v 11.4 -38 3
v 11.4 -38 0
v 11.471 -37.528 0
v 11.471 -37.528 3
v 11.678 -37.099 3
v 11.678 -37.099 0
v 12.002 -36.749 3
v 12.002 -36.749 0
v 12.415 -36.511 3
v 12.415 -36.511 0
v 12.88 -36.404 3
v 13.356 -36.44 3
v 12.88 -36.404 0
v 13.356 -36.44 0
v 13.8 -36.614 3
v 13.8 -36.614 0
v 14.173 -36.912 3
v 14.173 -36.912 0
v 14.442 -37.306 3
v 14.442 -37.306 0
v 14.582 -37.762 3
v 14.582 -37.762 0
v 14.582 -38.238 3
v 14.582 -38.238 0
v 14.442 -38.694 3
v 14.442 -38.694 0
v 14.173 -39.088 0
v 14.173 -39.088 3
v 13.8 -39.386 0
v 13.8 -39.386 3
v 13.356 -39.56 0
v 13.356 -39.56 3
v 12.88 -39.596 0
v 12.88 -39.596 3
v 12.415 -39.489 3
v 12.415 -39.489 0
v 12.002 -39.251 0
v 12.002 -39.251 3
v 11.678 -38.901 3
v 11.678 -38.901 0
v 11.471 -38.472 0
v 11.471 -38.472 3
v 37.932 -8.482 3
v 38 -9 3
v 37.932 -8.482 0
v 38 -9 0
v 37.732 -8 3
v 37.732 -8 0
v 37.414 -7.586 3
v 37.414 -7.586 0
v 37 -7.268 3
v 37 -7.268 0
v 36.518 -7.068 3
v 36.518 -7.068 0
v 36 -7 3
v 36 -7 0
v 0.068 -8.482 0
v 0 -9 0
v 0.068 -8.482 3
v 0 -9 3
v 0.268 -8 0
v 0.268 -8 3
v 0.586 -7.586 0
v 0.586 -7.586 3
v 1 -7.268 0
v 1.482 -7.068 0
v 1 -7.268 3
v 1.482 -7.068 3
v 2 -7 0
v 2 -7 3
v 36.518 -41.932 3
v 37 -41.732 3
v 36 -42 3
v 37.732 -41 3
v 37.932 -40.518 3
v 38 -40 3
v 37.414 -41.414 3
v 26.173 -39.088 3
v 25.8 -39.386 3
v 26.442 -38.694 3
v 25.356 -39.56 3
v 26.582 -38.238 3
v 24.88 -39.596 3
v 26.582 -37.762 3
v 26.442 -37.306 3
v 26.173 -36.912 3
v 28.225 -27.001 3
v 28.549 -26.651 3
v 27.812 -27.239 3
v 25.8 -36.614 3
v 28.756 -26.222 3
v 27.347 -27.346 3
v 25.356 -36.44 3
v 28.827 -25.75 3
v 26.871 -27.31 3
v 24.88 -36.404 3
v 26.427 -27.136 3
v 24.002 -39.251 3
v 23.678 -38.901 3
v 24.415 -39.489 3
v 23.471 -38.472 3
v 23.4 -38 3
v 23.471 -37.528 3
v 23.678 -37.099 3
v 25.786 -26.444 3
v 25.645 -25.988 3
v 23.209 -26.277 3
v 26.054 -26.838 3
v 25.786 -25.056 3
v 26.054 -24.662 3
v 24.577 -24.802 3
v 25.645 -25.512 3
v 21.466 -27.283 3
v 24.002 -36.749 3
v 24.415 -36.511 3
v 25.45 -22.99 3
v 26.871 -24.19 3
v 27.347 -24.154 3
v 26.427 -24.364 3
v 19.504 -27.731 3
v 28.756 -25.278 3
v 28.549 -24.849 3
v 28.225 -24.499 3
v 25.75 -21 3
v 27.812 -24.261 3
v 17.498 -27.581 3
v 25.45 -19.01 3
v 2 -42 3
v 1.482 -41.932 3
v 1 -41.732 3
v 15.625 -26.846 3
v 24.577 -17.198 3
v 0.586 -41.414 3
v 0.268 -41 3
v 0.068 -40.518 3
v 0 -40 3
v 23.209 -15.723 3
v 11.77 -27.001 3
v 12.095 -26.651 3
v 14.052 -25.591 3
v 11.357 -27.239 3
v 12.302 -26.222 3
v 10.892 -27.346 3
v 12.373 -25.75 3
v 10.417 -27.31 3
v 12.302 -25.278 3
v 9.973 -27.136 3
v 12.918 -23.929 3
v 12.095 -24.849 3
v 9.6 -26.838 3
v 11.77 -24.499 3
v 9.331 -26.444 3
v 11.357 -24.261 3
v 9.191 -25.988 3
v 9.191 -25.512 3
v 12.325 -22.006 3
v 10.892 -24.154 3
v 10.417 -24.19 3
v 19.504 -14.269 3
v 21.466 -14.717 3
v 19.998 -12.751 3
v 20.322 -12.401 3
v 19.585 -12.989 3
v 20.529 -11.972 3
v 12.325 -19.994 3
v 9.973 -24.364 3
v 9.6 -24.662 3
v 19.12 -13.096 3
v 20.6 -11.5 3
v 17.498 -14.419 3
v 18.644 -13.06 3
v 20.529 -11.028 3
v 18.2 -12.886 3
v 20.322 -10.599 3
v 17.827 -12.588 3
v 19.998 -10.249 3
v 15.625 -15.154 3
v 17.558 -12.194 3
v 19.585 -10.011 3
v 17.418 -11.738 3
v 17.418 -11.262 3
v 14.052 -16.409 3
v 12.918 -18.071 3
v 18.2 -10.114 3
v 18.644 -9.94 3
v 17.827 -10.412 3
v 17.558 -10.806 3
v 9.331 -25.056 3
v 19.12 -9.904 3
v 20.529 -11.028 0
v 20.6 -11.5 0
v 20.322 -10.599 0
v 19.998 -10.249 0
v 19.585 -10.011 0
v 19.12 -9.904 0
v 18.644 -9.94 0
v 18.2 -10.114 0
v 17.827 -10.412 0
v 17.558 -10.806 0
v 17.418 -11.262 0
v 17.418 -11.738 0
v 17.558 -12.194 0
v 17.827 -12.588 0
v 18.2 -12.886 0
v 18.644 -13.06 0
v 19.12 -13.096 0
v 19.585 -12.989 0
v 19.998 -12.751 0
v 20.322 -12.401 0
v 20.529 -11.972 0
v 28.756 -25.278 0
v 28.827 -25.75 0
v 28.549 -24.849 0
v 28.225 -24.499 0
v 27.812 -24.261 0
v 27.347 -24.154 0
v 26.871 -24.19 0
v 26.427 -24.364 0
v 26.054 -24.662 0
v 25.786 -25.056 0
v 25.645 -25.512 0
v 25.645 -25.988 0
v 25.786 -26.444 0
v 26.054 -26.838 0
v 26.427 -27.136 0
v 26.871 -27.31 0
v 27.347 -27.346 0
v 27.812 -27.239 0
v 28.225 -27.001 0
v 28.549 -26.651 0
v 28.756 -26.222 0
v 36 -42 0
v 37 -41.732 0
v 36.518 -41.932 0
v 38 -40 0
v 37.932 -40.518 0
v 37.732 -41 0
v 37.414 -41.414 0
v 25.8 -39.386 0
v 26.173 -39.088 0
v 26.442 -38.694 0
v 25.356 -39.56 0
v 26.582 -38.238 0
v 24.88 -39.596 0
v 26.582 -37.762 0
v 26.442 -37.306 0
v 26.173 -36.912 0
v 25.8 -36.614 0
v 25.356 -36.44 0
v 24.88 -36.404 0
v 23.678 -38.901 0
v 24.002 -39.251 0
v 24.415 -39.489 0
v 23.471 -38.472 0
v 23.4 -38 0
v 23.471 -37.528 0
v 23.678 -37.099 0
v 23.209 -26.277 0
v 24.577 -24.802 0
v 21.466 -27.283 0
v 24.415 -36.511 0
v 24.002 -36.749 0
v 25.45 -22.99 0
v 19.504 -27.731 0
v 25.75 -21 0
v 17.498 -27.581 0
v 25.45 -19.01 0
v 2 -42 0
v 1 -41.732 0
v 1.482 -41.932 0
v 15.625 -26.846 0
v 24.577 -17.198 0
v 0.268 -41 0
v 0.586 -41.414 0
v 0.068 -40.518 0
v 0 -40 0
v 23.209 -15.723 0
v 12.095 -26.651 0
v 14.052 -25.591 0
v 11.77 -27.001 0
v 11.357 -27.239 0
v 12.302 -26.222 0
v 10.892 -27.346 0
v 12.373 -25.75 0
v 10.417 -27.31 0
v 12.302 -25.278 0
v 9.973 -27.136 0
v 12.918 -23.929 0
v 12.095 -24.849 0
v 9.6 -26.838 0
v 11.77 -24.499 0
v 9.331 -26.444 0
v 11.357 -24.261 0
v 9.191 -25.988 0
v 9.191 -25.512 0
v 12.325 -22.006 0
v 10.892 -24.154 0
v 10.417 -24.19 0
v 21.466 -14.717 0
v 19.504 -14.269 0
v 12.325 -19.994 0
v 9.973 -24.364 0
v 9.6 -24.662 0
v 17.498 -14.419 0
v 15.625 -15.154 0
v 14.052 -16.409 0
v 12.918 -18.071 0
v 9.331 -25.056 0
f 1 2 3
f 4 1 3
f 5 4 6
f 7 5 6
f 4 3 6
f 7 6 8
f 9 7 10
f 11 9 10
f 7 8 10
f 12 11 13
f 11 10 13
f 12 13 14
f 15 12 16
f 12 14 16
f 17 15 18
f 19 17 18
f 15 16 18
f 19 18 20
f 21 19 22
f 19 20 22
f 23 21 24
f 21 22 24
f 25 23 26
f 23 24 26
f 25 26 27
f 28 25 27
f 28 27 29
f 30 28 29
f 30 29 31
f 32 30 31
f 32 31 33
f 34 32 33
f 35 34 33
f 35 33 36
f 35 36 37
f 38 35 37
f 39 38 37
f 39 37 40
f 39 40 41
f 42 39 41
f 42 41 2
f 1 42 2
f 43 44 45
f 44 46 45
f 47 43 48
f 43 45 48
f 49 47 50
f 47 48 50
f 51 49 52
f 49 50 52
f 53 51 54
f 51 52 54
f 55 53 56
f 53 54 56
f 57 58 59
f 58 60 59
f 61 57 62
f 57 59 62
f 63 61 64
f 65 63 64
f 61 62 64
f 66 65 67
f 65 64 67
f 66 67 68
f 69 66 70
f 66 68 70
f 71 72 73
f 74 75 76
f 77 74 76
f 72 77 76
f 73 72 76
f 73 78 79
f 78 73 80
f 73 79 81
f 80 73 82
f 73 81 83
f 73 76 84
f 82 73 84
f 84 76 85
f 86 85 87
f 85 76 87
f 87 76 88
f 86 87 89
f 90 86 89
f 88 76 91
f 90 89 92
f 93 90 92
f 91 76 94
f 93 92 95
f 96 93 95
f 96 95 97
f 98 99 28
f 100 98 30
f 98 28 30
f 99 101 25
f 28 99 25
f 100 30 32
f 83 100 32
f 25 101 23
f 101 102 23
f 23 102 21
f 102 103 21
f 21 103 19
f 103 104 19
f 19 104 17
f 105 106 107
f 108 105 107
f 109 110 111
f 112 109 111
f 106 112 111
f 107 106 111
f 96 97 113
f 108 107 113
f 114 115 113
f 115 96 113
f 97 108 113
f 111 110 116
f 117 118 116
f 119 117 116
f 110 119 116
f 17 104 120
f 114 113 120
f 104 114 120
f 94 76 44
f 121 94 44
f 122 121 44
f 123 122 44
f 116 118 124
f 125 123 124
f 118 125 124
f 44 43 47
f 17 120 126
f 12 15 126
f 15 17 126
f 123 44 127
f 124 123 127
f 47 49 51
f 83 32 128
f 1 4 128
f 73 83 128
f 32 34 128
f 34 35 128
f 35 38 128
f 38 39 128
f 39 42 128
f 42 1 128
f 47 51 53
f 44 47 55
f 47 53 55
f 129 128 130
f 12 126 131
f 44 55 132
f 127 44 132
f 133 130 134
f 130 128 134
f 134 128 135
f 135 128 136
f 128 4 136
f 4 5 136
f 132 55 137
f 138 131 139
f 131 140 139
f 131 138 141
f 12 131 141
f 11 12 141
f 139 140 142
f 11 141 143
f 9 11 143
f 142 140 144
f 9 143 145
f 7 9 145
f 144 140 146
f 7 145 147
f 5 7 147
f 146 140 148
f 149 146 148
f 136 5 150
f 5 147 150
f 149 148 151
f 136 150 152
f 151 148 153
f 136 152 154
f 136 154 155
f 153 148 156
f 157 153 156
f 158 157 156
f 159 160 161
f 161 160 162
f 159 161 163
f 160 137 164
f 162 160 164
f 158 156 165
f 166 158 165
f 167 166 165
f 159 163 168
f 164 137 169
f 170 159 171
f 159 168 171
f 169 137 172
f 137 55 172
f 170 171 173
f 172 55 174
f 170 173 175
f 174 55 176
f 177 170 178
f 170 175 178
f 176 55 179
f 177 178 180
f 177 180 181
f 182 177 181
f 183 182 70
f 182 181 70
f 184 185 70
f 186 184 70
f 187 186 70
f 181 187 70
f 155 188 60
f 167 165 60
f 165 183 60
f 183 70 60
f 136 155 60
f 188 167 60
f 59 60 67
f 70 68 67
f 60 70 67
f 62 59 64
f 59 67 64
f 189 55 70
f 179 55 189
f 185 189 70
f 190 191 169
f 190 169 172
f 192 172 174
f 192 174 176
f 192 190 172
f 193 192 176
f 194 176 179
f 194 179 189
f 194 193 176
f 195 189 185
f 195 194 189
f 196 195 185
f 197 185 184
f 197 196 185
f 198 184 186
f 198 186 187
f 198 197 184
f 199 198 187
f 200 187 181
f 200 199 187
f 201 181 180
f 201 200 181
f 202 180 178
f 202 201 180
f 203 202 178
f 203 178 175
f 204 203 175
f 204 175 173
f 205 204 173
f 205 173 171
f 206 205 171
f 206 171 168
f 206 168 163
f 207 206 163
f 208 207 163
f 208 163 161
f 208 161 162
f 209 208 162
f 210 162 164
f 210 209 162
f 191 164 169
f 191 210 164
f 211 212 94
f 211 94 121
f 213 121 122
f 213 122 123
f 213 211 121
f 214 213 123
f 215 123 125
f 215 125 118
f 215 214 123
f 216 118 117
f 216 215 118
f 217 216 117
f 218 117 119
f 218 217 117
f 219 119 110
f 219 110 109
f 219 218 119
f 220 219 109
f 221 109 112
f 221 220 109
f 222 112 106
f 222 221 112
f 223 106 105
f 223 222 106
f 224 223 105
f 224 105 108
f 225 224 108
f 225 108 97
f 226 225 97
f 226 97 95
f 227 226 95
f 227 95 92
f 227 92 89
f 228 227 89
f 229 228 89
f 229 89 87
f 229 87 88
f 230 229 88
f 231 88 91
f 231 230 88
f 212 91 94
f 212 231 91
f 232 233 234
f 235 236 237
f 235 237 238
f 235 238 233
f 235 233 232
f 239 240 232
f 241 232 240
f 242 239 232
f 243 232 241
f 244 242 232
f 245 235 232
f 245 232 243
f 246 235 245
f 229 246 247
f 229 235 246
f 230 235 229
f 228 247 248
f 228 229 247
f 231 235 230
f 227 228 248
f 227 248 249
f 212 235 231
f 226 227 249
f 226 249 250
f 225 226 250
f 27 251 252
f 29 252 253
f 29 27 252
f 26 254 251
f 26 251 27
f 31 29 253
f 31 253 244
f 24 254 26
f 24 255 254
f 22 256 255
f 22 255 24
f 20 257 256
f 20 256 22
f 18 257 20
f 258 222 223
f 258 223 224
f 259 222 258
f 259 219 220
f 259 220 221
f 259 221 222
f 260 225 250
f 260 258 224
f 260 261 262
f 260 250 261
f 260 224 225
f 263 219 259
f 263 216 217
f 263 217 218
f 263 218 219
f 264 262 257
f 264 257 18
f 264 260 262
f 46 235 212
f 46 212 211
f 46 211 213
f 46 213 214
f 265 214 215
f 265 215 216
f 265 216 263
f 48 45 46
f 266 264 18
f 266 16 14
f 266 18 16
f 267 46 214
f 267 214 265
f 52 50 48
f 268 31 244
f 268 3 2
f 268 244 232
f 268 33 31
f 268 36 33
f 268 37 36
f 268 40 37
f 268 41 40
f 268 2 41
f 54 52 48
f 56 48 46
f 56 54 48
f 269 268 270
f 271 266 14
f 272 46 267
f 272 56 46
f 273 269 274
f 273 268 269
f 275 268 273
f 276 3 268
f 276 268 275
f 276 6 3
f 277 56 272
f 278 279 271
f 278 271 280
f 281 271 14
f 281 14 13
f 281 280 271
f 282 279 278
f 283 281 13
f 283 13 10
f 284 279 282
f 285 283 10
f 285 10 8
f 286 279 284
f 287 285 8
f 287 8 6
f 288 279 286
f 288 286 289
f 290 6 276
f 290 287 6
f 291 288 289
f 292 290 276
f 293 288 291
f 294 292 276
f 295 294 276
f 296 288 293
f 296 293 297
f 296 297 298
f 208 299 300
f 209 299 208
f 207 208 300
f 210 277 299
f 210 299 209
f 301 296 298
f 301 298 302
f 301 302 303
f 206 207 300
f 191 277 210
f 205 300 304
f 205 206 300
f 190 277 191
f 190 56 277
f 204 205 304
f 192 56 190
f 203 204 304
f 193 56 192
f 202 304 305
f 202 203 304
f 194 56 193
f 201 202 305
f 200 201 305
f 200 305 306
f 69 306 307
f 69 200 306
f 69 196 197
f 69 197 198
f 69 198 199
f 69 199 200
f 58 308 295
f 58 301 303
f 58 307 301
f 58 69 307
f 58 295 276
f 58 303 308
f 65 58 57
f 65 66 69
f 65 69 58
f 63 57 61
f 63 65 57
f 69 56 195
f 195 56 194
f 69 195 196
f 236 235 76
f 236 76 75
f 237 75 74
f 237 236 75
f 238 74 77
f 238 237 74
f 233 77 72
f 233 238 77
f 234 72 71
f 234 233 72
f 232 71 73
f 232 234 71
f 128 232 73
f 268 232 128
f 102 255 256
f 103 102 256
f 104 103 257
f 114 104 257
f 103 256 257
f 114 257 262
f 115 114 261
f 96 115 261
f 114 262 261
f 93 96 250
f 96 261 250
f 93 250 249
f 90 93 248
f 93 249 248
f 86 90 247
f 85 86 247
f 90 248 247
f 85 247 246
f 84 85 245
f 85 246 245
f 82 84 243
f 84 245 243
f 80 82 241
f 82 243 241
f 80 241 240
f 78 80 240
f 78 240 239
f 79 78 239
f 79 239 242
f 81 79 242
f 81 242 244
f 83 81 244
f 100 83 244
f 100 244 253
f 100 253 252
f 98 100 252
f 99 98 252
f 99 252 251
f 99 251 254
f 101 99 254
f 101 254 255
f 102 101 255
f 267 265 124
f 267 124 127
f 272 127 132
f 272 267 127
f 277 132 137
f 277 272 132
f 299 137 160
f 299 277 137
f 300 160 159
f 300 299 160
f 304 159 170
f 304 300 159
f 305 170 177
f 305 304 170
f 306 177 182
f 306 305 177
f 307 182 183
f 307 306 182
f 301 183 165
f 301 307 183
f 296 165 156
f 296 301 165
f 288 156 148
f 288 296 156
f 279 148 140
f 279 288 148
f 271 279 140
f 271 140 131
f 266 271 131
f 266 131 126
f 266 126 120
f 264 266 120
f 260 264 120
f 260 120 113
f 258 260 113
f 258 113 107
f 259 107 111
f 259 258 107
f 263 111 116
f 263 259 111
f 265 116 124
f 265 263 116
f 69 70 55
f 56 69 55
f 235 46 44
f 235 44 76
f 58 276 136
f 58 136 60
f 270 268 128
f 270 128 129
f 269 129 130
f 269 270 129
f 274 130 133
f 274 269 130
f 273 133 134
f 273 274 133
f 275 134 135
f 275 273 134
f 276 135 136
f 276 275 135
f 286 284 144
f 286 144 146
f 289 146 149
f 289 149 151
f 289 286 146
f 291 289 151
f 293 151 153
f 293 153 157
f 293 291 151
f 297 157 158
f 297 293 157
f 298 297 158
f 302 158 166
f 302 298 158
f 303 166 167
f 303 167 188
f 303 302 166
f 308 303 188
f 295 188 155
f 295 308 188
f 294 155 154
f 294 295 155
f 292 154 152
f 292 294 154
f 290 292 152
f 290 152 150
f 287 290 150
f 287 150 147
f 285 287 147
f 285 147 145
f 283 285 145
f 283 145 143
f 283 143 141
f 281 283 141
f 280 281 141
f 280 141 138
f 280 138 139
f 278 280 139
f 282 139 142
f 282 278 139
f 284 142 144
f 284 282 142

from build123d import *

# Parameters (mm, degrees)
SKETCH_1_R          = 6.75
SKETCH_1_R_2        = 1.6
EXTRUDE_1_DEPTH     = 3
SKETCH_2_R          = 1.6
CUT_EXTRUDE_1_DEPTH = 10
SKETCH_3_W          = 59.008256567
SKETCH_3_H          = 13.932505023
CUT_EXTRUDE_2_DEPTH = 57.71860365
FILLET_1_R          = 2


with BuildPart() as part:
    # 草图1 → 凸台-拉伸1 (new body)
    with BuildSketch(Plane.XY):
        with BuildLine():
            Line((2, 0), (36, 0))
            ThreePointArc((36, 0), (37.414213562, -0.585786438), (38, -2))
            Line((38, -2), (38, -40))
            ThreePointArc((38, -40), (37.414213562, -41.414213562), (36, -42))
            Line((36, -42), (2, -42))
            ThreePointArc((2, -42), (0.585786438, -41.414213562), (0, -40))
            Line((0, -40), (0, -2))
            ThreePointArc((0, -2), (0.585786438, -0.585786438), (2, 0))
        make_face()
        with Locations((19, -21)):
            Circle(SKETCH_1_R, mode=Mode.SUBTRACT)
        with Locations((19, -11.5)):
            Circle(SKETCH_1_R_2, mode=Mode.SUBTRACT)
        with Locations((27.227241336, -25.75)):
            Circle(SKETCH_1_R_2, mode=Mode.SUBTRACT)
        with Locations((10.772758664, -25.75)):
            Circle(SKETCH_1_R_2, mode=Mode.SUBTRACT)
    extrude(amount=EXTRUDE_1_DEPTH)

    # 草图2 → 切除-拉伸1 (cut)
    with BuildSketch(Plane(origin=(0, 0, 0), x_dir=(-1, 0, 0), z_dir=(0, 0, -1))):
        with Locations((-13, -38)):
            Circle(SKETCH_2_R)
        with Locations((-25, -38)):
            Circle(SKETCH_2_R)
    extrude(amount=-CUT_EXTRUDE_1_DEPTH, mode=Mode.SUBTRACT)

    # 草图3 → 切除-拉伸2 (cut, through all)
    with BuildSketch(Plane.XY.offset(3)):
        with Locations((20.753628174, -0.033747488)):
            Rectangle(SKETCH_3_W, SKETCH_3_H)
    extrude(amount=-CUT_EXTRUDE_2_DEPTH, mode=Mode.SUBTRACT)

    # 圆角1
    fillet_1_edges = [part.edges().sort_by_distance(p)[0] for p in [
        (38, -7, 1.5),
        (0, -7, 1.5),
    ]]
    fillet(fillet_1_edges, radius=FILLET_1_R)


solid = part.part
